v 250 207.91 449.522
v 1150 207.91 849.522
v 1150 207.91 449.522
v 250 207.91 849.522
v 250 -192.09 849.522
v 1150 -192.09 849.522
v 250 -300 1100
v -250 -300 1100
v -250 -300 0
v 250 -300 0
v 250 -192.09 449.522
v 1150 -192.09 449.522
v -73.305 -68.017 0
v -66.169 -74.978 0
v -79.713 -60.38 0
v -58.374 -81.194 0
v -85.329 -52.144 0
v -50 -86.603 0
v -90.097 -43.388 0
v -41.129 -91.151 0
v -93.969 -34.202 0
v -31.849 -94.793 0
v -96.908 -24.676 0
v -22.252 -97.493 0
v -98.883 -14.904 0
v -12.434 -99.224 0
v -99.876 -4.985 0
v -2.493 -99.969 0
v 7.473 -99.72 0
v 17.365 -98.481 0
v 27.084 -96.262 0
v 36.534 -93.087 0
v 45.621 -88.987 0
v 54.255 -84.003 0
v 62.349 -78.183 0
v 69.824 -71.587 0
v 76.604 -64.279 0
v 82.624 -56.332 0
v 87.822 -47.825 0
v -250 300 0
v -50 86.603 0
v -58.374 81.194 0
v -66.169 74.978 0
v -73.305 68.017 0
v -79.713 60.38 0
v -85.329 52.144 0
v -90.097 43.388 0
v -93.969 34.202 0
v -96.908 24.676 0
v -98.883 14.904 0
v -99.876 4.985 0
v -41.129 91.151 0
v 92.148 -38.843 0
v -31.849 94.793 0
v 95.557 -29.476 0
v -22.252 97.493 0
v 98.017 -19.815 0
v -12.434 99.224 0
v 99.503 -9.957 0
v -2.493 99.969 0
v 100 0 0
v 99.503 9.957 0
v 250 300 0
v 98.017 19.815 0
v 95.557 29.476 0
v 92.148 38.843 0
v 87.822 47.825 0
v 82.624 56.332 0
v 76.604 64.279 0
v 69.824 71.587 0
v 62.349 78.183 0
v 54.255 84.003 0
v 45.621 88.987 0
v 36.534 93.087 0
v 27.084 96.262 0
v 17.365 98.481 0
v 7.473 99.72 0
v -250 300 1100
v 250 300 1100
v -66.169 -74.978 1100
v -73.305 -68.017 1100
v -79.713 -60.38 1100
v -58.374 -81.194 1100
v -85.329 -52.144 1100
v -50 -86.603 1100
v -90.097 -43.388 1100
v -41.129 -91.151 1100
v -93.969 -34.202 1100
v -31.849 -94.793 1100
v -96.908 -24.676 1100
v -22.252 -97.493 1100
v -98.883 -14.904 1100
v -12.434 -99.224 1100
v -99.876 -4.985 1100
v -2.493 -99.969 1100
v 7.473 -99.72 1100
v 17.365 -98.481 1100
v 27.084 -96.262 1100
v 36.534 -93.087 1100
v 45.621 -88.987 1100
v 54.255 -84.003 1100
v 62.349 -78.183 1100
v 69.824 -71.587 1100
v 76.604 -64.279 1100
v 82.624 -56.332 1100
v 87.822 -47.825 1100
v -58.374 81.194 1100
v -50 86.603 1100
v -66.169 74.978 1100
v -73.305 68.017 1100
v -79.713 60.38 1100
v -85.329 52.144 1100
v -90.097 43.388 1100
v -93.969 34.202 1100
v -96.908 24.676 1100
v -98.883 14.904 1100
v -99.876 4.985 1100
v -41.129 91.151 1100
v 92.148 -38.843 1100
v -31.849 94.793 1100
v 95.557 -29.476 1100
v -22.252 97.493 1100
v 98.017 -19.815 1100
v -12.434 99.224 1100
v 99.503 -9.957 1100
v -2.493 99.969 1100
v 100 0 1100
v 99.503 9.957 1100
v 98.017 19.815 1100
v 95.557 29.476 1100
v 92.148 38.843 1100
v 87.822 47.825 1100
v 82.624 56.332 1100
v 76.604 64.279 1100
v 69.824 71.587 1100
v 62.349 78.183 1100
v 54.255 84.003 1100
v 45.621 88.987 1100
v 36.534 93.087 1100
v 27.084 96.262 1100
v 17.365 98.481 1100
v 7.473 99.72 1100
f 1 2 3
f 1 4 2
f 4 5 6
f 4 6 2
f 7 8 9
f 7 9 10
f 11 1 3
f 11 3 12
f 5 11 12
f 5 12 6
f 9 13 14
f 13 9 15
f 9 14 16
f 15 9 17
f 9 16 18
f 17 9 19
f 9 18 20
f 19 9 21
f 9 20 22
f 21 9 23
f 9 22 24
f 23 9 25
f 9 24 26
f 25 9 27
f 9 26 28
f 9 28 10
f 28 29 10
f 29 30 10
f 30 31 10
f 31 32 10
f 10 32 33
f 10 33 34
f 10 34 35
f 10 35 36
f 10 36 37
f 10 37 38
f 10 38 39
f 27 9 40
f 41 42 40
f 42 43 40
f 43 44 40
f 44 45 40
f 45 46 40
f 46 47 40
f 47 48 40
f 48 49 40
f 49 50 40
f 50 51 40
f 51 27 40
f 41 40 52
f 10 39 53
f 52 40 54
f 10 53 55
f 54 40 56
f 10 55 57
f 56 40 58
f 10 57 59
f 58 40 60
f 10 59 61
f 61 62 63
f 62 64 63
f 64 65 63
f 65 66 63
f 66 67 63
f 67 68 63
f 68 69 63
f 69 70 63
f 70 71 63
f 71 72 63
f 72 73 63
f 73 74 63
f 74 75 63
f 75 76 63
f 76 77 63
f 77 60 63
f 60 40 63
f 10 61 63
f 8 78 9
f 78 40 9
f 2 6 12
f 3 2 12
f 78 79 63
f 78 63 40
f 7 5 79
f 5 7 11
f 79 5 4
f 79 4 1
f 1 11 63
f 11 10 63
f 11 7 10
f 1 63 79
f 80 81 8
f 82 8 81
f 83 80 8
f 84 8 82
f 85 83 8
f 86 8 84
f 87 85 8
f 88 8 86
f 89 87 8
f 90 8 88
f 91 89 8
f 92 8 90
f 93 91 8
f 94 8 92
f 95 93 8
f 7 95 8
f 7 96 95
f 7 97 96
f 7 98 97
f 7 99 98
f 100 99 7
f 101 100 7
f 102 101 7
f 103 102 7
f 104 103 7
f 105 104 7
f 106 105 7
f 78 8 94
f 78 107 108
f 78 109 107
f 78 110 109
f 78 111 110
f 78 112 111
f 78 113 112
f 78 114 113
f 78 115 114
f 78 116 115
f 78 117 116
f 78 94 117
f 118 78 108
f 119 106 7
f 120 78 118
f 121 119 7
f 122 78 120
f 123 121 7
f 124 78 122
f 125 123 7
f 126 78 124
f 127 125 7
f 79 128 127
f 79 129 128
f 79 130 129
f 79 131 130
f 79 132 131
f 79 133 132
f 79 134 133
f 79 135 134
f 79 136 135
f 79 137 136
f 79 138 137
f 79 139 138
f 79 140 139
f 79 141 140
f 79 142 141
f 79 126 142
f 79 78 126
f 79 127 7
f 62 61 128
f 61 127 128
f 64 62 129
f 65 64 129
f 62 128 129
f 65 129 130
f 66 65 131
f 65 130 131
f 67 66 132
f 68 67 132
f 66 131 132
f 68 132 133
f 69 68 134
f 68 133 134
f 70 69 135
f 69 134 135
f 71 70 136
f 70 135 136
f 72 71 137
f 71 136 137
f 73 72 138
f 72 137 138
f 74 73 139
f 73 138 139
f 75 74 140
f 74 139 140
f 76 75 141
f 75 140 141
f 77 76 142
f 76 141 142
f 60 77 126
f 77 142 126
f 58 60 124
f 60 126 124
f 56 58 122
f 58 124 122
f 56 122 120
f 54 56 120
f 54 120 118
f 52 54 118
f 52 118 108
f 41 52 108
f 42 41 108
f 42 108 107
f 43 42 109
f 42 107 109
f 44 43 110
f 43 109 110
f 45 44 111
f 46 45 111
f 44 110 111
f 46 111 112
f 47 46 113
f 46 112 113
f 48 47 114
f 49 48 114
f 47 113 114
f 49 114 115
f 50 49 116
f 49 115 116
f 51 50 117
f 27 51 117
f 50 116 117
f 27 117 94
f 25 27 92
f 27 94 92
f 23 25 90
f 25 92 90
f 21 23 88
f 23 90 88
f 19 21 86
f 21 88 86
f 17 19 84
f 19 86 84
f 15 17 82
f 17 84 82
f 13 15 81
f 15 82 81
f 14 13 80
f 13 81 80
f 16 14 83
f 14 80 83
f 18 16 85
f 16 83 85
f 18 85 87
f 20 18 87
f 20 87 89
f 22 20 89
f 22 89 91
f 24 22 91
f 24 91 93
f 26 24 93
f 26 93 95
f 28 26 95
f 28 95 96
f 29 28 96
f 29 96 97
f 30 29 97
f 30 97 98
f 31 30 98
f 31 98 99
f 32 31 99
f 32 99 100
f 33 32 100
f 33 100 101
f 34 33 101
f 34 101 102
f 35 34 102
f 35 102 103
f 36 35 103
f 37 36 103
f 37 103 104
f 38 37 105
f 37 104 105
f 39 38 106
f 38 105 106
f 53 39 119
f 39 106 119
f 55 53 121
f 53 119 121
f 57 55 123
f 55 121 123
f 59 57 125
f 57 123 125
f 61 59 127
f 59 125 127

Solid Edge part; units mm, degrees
sketch "Sketch1" plane through (0, 0, 0) normal (0, 0, 1) x (1, 0, 0)
  line L0 (-250, -300) -> (250, -300)
  line L1 (250, -300) -> (250, 300)
  line L2 (250, 300) -> (-250, 300)
  line L3 (-250, 300) -> (-250, -300)
  dimension "D1" = 600
  dimension "D2" = 500
extrude "Protrusion1" add sketch "Sketch1" along normal blind 1100
sketch "Sketch2" plane through (0, 0, 1100) normal (0, 0, 1) x (1, 0, 0)
  circle A0 centre (0, 0) radius 100
  dimension "D1" = 200
extrude "Cutout1" cut sketch "Sketch2" against normal up to next
sketch "Sketch3" plane through (250, 0, 550) normal (1, 0, 0) x (0, 1, 0)
  line L0 (-192.0896, 299.5224) -> (207.9104, 299.5224)
  line L1 (207.9104, 299.5224) -> (207.9104, -100.4776)
  line L2 (207.9104, -100.4776) -> (-192.0896, -100.4776)
  line L3 (-192.0896, -100.4776) -> (-192.0896, 299.5224)
  dimension "D1" = 400
  dimension "D2" = 400
extrude "Protrusion2" add sketch "Sketch3" along normal blind 900
